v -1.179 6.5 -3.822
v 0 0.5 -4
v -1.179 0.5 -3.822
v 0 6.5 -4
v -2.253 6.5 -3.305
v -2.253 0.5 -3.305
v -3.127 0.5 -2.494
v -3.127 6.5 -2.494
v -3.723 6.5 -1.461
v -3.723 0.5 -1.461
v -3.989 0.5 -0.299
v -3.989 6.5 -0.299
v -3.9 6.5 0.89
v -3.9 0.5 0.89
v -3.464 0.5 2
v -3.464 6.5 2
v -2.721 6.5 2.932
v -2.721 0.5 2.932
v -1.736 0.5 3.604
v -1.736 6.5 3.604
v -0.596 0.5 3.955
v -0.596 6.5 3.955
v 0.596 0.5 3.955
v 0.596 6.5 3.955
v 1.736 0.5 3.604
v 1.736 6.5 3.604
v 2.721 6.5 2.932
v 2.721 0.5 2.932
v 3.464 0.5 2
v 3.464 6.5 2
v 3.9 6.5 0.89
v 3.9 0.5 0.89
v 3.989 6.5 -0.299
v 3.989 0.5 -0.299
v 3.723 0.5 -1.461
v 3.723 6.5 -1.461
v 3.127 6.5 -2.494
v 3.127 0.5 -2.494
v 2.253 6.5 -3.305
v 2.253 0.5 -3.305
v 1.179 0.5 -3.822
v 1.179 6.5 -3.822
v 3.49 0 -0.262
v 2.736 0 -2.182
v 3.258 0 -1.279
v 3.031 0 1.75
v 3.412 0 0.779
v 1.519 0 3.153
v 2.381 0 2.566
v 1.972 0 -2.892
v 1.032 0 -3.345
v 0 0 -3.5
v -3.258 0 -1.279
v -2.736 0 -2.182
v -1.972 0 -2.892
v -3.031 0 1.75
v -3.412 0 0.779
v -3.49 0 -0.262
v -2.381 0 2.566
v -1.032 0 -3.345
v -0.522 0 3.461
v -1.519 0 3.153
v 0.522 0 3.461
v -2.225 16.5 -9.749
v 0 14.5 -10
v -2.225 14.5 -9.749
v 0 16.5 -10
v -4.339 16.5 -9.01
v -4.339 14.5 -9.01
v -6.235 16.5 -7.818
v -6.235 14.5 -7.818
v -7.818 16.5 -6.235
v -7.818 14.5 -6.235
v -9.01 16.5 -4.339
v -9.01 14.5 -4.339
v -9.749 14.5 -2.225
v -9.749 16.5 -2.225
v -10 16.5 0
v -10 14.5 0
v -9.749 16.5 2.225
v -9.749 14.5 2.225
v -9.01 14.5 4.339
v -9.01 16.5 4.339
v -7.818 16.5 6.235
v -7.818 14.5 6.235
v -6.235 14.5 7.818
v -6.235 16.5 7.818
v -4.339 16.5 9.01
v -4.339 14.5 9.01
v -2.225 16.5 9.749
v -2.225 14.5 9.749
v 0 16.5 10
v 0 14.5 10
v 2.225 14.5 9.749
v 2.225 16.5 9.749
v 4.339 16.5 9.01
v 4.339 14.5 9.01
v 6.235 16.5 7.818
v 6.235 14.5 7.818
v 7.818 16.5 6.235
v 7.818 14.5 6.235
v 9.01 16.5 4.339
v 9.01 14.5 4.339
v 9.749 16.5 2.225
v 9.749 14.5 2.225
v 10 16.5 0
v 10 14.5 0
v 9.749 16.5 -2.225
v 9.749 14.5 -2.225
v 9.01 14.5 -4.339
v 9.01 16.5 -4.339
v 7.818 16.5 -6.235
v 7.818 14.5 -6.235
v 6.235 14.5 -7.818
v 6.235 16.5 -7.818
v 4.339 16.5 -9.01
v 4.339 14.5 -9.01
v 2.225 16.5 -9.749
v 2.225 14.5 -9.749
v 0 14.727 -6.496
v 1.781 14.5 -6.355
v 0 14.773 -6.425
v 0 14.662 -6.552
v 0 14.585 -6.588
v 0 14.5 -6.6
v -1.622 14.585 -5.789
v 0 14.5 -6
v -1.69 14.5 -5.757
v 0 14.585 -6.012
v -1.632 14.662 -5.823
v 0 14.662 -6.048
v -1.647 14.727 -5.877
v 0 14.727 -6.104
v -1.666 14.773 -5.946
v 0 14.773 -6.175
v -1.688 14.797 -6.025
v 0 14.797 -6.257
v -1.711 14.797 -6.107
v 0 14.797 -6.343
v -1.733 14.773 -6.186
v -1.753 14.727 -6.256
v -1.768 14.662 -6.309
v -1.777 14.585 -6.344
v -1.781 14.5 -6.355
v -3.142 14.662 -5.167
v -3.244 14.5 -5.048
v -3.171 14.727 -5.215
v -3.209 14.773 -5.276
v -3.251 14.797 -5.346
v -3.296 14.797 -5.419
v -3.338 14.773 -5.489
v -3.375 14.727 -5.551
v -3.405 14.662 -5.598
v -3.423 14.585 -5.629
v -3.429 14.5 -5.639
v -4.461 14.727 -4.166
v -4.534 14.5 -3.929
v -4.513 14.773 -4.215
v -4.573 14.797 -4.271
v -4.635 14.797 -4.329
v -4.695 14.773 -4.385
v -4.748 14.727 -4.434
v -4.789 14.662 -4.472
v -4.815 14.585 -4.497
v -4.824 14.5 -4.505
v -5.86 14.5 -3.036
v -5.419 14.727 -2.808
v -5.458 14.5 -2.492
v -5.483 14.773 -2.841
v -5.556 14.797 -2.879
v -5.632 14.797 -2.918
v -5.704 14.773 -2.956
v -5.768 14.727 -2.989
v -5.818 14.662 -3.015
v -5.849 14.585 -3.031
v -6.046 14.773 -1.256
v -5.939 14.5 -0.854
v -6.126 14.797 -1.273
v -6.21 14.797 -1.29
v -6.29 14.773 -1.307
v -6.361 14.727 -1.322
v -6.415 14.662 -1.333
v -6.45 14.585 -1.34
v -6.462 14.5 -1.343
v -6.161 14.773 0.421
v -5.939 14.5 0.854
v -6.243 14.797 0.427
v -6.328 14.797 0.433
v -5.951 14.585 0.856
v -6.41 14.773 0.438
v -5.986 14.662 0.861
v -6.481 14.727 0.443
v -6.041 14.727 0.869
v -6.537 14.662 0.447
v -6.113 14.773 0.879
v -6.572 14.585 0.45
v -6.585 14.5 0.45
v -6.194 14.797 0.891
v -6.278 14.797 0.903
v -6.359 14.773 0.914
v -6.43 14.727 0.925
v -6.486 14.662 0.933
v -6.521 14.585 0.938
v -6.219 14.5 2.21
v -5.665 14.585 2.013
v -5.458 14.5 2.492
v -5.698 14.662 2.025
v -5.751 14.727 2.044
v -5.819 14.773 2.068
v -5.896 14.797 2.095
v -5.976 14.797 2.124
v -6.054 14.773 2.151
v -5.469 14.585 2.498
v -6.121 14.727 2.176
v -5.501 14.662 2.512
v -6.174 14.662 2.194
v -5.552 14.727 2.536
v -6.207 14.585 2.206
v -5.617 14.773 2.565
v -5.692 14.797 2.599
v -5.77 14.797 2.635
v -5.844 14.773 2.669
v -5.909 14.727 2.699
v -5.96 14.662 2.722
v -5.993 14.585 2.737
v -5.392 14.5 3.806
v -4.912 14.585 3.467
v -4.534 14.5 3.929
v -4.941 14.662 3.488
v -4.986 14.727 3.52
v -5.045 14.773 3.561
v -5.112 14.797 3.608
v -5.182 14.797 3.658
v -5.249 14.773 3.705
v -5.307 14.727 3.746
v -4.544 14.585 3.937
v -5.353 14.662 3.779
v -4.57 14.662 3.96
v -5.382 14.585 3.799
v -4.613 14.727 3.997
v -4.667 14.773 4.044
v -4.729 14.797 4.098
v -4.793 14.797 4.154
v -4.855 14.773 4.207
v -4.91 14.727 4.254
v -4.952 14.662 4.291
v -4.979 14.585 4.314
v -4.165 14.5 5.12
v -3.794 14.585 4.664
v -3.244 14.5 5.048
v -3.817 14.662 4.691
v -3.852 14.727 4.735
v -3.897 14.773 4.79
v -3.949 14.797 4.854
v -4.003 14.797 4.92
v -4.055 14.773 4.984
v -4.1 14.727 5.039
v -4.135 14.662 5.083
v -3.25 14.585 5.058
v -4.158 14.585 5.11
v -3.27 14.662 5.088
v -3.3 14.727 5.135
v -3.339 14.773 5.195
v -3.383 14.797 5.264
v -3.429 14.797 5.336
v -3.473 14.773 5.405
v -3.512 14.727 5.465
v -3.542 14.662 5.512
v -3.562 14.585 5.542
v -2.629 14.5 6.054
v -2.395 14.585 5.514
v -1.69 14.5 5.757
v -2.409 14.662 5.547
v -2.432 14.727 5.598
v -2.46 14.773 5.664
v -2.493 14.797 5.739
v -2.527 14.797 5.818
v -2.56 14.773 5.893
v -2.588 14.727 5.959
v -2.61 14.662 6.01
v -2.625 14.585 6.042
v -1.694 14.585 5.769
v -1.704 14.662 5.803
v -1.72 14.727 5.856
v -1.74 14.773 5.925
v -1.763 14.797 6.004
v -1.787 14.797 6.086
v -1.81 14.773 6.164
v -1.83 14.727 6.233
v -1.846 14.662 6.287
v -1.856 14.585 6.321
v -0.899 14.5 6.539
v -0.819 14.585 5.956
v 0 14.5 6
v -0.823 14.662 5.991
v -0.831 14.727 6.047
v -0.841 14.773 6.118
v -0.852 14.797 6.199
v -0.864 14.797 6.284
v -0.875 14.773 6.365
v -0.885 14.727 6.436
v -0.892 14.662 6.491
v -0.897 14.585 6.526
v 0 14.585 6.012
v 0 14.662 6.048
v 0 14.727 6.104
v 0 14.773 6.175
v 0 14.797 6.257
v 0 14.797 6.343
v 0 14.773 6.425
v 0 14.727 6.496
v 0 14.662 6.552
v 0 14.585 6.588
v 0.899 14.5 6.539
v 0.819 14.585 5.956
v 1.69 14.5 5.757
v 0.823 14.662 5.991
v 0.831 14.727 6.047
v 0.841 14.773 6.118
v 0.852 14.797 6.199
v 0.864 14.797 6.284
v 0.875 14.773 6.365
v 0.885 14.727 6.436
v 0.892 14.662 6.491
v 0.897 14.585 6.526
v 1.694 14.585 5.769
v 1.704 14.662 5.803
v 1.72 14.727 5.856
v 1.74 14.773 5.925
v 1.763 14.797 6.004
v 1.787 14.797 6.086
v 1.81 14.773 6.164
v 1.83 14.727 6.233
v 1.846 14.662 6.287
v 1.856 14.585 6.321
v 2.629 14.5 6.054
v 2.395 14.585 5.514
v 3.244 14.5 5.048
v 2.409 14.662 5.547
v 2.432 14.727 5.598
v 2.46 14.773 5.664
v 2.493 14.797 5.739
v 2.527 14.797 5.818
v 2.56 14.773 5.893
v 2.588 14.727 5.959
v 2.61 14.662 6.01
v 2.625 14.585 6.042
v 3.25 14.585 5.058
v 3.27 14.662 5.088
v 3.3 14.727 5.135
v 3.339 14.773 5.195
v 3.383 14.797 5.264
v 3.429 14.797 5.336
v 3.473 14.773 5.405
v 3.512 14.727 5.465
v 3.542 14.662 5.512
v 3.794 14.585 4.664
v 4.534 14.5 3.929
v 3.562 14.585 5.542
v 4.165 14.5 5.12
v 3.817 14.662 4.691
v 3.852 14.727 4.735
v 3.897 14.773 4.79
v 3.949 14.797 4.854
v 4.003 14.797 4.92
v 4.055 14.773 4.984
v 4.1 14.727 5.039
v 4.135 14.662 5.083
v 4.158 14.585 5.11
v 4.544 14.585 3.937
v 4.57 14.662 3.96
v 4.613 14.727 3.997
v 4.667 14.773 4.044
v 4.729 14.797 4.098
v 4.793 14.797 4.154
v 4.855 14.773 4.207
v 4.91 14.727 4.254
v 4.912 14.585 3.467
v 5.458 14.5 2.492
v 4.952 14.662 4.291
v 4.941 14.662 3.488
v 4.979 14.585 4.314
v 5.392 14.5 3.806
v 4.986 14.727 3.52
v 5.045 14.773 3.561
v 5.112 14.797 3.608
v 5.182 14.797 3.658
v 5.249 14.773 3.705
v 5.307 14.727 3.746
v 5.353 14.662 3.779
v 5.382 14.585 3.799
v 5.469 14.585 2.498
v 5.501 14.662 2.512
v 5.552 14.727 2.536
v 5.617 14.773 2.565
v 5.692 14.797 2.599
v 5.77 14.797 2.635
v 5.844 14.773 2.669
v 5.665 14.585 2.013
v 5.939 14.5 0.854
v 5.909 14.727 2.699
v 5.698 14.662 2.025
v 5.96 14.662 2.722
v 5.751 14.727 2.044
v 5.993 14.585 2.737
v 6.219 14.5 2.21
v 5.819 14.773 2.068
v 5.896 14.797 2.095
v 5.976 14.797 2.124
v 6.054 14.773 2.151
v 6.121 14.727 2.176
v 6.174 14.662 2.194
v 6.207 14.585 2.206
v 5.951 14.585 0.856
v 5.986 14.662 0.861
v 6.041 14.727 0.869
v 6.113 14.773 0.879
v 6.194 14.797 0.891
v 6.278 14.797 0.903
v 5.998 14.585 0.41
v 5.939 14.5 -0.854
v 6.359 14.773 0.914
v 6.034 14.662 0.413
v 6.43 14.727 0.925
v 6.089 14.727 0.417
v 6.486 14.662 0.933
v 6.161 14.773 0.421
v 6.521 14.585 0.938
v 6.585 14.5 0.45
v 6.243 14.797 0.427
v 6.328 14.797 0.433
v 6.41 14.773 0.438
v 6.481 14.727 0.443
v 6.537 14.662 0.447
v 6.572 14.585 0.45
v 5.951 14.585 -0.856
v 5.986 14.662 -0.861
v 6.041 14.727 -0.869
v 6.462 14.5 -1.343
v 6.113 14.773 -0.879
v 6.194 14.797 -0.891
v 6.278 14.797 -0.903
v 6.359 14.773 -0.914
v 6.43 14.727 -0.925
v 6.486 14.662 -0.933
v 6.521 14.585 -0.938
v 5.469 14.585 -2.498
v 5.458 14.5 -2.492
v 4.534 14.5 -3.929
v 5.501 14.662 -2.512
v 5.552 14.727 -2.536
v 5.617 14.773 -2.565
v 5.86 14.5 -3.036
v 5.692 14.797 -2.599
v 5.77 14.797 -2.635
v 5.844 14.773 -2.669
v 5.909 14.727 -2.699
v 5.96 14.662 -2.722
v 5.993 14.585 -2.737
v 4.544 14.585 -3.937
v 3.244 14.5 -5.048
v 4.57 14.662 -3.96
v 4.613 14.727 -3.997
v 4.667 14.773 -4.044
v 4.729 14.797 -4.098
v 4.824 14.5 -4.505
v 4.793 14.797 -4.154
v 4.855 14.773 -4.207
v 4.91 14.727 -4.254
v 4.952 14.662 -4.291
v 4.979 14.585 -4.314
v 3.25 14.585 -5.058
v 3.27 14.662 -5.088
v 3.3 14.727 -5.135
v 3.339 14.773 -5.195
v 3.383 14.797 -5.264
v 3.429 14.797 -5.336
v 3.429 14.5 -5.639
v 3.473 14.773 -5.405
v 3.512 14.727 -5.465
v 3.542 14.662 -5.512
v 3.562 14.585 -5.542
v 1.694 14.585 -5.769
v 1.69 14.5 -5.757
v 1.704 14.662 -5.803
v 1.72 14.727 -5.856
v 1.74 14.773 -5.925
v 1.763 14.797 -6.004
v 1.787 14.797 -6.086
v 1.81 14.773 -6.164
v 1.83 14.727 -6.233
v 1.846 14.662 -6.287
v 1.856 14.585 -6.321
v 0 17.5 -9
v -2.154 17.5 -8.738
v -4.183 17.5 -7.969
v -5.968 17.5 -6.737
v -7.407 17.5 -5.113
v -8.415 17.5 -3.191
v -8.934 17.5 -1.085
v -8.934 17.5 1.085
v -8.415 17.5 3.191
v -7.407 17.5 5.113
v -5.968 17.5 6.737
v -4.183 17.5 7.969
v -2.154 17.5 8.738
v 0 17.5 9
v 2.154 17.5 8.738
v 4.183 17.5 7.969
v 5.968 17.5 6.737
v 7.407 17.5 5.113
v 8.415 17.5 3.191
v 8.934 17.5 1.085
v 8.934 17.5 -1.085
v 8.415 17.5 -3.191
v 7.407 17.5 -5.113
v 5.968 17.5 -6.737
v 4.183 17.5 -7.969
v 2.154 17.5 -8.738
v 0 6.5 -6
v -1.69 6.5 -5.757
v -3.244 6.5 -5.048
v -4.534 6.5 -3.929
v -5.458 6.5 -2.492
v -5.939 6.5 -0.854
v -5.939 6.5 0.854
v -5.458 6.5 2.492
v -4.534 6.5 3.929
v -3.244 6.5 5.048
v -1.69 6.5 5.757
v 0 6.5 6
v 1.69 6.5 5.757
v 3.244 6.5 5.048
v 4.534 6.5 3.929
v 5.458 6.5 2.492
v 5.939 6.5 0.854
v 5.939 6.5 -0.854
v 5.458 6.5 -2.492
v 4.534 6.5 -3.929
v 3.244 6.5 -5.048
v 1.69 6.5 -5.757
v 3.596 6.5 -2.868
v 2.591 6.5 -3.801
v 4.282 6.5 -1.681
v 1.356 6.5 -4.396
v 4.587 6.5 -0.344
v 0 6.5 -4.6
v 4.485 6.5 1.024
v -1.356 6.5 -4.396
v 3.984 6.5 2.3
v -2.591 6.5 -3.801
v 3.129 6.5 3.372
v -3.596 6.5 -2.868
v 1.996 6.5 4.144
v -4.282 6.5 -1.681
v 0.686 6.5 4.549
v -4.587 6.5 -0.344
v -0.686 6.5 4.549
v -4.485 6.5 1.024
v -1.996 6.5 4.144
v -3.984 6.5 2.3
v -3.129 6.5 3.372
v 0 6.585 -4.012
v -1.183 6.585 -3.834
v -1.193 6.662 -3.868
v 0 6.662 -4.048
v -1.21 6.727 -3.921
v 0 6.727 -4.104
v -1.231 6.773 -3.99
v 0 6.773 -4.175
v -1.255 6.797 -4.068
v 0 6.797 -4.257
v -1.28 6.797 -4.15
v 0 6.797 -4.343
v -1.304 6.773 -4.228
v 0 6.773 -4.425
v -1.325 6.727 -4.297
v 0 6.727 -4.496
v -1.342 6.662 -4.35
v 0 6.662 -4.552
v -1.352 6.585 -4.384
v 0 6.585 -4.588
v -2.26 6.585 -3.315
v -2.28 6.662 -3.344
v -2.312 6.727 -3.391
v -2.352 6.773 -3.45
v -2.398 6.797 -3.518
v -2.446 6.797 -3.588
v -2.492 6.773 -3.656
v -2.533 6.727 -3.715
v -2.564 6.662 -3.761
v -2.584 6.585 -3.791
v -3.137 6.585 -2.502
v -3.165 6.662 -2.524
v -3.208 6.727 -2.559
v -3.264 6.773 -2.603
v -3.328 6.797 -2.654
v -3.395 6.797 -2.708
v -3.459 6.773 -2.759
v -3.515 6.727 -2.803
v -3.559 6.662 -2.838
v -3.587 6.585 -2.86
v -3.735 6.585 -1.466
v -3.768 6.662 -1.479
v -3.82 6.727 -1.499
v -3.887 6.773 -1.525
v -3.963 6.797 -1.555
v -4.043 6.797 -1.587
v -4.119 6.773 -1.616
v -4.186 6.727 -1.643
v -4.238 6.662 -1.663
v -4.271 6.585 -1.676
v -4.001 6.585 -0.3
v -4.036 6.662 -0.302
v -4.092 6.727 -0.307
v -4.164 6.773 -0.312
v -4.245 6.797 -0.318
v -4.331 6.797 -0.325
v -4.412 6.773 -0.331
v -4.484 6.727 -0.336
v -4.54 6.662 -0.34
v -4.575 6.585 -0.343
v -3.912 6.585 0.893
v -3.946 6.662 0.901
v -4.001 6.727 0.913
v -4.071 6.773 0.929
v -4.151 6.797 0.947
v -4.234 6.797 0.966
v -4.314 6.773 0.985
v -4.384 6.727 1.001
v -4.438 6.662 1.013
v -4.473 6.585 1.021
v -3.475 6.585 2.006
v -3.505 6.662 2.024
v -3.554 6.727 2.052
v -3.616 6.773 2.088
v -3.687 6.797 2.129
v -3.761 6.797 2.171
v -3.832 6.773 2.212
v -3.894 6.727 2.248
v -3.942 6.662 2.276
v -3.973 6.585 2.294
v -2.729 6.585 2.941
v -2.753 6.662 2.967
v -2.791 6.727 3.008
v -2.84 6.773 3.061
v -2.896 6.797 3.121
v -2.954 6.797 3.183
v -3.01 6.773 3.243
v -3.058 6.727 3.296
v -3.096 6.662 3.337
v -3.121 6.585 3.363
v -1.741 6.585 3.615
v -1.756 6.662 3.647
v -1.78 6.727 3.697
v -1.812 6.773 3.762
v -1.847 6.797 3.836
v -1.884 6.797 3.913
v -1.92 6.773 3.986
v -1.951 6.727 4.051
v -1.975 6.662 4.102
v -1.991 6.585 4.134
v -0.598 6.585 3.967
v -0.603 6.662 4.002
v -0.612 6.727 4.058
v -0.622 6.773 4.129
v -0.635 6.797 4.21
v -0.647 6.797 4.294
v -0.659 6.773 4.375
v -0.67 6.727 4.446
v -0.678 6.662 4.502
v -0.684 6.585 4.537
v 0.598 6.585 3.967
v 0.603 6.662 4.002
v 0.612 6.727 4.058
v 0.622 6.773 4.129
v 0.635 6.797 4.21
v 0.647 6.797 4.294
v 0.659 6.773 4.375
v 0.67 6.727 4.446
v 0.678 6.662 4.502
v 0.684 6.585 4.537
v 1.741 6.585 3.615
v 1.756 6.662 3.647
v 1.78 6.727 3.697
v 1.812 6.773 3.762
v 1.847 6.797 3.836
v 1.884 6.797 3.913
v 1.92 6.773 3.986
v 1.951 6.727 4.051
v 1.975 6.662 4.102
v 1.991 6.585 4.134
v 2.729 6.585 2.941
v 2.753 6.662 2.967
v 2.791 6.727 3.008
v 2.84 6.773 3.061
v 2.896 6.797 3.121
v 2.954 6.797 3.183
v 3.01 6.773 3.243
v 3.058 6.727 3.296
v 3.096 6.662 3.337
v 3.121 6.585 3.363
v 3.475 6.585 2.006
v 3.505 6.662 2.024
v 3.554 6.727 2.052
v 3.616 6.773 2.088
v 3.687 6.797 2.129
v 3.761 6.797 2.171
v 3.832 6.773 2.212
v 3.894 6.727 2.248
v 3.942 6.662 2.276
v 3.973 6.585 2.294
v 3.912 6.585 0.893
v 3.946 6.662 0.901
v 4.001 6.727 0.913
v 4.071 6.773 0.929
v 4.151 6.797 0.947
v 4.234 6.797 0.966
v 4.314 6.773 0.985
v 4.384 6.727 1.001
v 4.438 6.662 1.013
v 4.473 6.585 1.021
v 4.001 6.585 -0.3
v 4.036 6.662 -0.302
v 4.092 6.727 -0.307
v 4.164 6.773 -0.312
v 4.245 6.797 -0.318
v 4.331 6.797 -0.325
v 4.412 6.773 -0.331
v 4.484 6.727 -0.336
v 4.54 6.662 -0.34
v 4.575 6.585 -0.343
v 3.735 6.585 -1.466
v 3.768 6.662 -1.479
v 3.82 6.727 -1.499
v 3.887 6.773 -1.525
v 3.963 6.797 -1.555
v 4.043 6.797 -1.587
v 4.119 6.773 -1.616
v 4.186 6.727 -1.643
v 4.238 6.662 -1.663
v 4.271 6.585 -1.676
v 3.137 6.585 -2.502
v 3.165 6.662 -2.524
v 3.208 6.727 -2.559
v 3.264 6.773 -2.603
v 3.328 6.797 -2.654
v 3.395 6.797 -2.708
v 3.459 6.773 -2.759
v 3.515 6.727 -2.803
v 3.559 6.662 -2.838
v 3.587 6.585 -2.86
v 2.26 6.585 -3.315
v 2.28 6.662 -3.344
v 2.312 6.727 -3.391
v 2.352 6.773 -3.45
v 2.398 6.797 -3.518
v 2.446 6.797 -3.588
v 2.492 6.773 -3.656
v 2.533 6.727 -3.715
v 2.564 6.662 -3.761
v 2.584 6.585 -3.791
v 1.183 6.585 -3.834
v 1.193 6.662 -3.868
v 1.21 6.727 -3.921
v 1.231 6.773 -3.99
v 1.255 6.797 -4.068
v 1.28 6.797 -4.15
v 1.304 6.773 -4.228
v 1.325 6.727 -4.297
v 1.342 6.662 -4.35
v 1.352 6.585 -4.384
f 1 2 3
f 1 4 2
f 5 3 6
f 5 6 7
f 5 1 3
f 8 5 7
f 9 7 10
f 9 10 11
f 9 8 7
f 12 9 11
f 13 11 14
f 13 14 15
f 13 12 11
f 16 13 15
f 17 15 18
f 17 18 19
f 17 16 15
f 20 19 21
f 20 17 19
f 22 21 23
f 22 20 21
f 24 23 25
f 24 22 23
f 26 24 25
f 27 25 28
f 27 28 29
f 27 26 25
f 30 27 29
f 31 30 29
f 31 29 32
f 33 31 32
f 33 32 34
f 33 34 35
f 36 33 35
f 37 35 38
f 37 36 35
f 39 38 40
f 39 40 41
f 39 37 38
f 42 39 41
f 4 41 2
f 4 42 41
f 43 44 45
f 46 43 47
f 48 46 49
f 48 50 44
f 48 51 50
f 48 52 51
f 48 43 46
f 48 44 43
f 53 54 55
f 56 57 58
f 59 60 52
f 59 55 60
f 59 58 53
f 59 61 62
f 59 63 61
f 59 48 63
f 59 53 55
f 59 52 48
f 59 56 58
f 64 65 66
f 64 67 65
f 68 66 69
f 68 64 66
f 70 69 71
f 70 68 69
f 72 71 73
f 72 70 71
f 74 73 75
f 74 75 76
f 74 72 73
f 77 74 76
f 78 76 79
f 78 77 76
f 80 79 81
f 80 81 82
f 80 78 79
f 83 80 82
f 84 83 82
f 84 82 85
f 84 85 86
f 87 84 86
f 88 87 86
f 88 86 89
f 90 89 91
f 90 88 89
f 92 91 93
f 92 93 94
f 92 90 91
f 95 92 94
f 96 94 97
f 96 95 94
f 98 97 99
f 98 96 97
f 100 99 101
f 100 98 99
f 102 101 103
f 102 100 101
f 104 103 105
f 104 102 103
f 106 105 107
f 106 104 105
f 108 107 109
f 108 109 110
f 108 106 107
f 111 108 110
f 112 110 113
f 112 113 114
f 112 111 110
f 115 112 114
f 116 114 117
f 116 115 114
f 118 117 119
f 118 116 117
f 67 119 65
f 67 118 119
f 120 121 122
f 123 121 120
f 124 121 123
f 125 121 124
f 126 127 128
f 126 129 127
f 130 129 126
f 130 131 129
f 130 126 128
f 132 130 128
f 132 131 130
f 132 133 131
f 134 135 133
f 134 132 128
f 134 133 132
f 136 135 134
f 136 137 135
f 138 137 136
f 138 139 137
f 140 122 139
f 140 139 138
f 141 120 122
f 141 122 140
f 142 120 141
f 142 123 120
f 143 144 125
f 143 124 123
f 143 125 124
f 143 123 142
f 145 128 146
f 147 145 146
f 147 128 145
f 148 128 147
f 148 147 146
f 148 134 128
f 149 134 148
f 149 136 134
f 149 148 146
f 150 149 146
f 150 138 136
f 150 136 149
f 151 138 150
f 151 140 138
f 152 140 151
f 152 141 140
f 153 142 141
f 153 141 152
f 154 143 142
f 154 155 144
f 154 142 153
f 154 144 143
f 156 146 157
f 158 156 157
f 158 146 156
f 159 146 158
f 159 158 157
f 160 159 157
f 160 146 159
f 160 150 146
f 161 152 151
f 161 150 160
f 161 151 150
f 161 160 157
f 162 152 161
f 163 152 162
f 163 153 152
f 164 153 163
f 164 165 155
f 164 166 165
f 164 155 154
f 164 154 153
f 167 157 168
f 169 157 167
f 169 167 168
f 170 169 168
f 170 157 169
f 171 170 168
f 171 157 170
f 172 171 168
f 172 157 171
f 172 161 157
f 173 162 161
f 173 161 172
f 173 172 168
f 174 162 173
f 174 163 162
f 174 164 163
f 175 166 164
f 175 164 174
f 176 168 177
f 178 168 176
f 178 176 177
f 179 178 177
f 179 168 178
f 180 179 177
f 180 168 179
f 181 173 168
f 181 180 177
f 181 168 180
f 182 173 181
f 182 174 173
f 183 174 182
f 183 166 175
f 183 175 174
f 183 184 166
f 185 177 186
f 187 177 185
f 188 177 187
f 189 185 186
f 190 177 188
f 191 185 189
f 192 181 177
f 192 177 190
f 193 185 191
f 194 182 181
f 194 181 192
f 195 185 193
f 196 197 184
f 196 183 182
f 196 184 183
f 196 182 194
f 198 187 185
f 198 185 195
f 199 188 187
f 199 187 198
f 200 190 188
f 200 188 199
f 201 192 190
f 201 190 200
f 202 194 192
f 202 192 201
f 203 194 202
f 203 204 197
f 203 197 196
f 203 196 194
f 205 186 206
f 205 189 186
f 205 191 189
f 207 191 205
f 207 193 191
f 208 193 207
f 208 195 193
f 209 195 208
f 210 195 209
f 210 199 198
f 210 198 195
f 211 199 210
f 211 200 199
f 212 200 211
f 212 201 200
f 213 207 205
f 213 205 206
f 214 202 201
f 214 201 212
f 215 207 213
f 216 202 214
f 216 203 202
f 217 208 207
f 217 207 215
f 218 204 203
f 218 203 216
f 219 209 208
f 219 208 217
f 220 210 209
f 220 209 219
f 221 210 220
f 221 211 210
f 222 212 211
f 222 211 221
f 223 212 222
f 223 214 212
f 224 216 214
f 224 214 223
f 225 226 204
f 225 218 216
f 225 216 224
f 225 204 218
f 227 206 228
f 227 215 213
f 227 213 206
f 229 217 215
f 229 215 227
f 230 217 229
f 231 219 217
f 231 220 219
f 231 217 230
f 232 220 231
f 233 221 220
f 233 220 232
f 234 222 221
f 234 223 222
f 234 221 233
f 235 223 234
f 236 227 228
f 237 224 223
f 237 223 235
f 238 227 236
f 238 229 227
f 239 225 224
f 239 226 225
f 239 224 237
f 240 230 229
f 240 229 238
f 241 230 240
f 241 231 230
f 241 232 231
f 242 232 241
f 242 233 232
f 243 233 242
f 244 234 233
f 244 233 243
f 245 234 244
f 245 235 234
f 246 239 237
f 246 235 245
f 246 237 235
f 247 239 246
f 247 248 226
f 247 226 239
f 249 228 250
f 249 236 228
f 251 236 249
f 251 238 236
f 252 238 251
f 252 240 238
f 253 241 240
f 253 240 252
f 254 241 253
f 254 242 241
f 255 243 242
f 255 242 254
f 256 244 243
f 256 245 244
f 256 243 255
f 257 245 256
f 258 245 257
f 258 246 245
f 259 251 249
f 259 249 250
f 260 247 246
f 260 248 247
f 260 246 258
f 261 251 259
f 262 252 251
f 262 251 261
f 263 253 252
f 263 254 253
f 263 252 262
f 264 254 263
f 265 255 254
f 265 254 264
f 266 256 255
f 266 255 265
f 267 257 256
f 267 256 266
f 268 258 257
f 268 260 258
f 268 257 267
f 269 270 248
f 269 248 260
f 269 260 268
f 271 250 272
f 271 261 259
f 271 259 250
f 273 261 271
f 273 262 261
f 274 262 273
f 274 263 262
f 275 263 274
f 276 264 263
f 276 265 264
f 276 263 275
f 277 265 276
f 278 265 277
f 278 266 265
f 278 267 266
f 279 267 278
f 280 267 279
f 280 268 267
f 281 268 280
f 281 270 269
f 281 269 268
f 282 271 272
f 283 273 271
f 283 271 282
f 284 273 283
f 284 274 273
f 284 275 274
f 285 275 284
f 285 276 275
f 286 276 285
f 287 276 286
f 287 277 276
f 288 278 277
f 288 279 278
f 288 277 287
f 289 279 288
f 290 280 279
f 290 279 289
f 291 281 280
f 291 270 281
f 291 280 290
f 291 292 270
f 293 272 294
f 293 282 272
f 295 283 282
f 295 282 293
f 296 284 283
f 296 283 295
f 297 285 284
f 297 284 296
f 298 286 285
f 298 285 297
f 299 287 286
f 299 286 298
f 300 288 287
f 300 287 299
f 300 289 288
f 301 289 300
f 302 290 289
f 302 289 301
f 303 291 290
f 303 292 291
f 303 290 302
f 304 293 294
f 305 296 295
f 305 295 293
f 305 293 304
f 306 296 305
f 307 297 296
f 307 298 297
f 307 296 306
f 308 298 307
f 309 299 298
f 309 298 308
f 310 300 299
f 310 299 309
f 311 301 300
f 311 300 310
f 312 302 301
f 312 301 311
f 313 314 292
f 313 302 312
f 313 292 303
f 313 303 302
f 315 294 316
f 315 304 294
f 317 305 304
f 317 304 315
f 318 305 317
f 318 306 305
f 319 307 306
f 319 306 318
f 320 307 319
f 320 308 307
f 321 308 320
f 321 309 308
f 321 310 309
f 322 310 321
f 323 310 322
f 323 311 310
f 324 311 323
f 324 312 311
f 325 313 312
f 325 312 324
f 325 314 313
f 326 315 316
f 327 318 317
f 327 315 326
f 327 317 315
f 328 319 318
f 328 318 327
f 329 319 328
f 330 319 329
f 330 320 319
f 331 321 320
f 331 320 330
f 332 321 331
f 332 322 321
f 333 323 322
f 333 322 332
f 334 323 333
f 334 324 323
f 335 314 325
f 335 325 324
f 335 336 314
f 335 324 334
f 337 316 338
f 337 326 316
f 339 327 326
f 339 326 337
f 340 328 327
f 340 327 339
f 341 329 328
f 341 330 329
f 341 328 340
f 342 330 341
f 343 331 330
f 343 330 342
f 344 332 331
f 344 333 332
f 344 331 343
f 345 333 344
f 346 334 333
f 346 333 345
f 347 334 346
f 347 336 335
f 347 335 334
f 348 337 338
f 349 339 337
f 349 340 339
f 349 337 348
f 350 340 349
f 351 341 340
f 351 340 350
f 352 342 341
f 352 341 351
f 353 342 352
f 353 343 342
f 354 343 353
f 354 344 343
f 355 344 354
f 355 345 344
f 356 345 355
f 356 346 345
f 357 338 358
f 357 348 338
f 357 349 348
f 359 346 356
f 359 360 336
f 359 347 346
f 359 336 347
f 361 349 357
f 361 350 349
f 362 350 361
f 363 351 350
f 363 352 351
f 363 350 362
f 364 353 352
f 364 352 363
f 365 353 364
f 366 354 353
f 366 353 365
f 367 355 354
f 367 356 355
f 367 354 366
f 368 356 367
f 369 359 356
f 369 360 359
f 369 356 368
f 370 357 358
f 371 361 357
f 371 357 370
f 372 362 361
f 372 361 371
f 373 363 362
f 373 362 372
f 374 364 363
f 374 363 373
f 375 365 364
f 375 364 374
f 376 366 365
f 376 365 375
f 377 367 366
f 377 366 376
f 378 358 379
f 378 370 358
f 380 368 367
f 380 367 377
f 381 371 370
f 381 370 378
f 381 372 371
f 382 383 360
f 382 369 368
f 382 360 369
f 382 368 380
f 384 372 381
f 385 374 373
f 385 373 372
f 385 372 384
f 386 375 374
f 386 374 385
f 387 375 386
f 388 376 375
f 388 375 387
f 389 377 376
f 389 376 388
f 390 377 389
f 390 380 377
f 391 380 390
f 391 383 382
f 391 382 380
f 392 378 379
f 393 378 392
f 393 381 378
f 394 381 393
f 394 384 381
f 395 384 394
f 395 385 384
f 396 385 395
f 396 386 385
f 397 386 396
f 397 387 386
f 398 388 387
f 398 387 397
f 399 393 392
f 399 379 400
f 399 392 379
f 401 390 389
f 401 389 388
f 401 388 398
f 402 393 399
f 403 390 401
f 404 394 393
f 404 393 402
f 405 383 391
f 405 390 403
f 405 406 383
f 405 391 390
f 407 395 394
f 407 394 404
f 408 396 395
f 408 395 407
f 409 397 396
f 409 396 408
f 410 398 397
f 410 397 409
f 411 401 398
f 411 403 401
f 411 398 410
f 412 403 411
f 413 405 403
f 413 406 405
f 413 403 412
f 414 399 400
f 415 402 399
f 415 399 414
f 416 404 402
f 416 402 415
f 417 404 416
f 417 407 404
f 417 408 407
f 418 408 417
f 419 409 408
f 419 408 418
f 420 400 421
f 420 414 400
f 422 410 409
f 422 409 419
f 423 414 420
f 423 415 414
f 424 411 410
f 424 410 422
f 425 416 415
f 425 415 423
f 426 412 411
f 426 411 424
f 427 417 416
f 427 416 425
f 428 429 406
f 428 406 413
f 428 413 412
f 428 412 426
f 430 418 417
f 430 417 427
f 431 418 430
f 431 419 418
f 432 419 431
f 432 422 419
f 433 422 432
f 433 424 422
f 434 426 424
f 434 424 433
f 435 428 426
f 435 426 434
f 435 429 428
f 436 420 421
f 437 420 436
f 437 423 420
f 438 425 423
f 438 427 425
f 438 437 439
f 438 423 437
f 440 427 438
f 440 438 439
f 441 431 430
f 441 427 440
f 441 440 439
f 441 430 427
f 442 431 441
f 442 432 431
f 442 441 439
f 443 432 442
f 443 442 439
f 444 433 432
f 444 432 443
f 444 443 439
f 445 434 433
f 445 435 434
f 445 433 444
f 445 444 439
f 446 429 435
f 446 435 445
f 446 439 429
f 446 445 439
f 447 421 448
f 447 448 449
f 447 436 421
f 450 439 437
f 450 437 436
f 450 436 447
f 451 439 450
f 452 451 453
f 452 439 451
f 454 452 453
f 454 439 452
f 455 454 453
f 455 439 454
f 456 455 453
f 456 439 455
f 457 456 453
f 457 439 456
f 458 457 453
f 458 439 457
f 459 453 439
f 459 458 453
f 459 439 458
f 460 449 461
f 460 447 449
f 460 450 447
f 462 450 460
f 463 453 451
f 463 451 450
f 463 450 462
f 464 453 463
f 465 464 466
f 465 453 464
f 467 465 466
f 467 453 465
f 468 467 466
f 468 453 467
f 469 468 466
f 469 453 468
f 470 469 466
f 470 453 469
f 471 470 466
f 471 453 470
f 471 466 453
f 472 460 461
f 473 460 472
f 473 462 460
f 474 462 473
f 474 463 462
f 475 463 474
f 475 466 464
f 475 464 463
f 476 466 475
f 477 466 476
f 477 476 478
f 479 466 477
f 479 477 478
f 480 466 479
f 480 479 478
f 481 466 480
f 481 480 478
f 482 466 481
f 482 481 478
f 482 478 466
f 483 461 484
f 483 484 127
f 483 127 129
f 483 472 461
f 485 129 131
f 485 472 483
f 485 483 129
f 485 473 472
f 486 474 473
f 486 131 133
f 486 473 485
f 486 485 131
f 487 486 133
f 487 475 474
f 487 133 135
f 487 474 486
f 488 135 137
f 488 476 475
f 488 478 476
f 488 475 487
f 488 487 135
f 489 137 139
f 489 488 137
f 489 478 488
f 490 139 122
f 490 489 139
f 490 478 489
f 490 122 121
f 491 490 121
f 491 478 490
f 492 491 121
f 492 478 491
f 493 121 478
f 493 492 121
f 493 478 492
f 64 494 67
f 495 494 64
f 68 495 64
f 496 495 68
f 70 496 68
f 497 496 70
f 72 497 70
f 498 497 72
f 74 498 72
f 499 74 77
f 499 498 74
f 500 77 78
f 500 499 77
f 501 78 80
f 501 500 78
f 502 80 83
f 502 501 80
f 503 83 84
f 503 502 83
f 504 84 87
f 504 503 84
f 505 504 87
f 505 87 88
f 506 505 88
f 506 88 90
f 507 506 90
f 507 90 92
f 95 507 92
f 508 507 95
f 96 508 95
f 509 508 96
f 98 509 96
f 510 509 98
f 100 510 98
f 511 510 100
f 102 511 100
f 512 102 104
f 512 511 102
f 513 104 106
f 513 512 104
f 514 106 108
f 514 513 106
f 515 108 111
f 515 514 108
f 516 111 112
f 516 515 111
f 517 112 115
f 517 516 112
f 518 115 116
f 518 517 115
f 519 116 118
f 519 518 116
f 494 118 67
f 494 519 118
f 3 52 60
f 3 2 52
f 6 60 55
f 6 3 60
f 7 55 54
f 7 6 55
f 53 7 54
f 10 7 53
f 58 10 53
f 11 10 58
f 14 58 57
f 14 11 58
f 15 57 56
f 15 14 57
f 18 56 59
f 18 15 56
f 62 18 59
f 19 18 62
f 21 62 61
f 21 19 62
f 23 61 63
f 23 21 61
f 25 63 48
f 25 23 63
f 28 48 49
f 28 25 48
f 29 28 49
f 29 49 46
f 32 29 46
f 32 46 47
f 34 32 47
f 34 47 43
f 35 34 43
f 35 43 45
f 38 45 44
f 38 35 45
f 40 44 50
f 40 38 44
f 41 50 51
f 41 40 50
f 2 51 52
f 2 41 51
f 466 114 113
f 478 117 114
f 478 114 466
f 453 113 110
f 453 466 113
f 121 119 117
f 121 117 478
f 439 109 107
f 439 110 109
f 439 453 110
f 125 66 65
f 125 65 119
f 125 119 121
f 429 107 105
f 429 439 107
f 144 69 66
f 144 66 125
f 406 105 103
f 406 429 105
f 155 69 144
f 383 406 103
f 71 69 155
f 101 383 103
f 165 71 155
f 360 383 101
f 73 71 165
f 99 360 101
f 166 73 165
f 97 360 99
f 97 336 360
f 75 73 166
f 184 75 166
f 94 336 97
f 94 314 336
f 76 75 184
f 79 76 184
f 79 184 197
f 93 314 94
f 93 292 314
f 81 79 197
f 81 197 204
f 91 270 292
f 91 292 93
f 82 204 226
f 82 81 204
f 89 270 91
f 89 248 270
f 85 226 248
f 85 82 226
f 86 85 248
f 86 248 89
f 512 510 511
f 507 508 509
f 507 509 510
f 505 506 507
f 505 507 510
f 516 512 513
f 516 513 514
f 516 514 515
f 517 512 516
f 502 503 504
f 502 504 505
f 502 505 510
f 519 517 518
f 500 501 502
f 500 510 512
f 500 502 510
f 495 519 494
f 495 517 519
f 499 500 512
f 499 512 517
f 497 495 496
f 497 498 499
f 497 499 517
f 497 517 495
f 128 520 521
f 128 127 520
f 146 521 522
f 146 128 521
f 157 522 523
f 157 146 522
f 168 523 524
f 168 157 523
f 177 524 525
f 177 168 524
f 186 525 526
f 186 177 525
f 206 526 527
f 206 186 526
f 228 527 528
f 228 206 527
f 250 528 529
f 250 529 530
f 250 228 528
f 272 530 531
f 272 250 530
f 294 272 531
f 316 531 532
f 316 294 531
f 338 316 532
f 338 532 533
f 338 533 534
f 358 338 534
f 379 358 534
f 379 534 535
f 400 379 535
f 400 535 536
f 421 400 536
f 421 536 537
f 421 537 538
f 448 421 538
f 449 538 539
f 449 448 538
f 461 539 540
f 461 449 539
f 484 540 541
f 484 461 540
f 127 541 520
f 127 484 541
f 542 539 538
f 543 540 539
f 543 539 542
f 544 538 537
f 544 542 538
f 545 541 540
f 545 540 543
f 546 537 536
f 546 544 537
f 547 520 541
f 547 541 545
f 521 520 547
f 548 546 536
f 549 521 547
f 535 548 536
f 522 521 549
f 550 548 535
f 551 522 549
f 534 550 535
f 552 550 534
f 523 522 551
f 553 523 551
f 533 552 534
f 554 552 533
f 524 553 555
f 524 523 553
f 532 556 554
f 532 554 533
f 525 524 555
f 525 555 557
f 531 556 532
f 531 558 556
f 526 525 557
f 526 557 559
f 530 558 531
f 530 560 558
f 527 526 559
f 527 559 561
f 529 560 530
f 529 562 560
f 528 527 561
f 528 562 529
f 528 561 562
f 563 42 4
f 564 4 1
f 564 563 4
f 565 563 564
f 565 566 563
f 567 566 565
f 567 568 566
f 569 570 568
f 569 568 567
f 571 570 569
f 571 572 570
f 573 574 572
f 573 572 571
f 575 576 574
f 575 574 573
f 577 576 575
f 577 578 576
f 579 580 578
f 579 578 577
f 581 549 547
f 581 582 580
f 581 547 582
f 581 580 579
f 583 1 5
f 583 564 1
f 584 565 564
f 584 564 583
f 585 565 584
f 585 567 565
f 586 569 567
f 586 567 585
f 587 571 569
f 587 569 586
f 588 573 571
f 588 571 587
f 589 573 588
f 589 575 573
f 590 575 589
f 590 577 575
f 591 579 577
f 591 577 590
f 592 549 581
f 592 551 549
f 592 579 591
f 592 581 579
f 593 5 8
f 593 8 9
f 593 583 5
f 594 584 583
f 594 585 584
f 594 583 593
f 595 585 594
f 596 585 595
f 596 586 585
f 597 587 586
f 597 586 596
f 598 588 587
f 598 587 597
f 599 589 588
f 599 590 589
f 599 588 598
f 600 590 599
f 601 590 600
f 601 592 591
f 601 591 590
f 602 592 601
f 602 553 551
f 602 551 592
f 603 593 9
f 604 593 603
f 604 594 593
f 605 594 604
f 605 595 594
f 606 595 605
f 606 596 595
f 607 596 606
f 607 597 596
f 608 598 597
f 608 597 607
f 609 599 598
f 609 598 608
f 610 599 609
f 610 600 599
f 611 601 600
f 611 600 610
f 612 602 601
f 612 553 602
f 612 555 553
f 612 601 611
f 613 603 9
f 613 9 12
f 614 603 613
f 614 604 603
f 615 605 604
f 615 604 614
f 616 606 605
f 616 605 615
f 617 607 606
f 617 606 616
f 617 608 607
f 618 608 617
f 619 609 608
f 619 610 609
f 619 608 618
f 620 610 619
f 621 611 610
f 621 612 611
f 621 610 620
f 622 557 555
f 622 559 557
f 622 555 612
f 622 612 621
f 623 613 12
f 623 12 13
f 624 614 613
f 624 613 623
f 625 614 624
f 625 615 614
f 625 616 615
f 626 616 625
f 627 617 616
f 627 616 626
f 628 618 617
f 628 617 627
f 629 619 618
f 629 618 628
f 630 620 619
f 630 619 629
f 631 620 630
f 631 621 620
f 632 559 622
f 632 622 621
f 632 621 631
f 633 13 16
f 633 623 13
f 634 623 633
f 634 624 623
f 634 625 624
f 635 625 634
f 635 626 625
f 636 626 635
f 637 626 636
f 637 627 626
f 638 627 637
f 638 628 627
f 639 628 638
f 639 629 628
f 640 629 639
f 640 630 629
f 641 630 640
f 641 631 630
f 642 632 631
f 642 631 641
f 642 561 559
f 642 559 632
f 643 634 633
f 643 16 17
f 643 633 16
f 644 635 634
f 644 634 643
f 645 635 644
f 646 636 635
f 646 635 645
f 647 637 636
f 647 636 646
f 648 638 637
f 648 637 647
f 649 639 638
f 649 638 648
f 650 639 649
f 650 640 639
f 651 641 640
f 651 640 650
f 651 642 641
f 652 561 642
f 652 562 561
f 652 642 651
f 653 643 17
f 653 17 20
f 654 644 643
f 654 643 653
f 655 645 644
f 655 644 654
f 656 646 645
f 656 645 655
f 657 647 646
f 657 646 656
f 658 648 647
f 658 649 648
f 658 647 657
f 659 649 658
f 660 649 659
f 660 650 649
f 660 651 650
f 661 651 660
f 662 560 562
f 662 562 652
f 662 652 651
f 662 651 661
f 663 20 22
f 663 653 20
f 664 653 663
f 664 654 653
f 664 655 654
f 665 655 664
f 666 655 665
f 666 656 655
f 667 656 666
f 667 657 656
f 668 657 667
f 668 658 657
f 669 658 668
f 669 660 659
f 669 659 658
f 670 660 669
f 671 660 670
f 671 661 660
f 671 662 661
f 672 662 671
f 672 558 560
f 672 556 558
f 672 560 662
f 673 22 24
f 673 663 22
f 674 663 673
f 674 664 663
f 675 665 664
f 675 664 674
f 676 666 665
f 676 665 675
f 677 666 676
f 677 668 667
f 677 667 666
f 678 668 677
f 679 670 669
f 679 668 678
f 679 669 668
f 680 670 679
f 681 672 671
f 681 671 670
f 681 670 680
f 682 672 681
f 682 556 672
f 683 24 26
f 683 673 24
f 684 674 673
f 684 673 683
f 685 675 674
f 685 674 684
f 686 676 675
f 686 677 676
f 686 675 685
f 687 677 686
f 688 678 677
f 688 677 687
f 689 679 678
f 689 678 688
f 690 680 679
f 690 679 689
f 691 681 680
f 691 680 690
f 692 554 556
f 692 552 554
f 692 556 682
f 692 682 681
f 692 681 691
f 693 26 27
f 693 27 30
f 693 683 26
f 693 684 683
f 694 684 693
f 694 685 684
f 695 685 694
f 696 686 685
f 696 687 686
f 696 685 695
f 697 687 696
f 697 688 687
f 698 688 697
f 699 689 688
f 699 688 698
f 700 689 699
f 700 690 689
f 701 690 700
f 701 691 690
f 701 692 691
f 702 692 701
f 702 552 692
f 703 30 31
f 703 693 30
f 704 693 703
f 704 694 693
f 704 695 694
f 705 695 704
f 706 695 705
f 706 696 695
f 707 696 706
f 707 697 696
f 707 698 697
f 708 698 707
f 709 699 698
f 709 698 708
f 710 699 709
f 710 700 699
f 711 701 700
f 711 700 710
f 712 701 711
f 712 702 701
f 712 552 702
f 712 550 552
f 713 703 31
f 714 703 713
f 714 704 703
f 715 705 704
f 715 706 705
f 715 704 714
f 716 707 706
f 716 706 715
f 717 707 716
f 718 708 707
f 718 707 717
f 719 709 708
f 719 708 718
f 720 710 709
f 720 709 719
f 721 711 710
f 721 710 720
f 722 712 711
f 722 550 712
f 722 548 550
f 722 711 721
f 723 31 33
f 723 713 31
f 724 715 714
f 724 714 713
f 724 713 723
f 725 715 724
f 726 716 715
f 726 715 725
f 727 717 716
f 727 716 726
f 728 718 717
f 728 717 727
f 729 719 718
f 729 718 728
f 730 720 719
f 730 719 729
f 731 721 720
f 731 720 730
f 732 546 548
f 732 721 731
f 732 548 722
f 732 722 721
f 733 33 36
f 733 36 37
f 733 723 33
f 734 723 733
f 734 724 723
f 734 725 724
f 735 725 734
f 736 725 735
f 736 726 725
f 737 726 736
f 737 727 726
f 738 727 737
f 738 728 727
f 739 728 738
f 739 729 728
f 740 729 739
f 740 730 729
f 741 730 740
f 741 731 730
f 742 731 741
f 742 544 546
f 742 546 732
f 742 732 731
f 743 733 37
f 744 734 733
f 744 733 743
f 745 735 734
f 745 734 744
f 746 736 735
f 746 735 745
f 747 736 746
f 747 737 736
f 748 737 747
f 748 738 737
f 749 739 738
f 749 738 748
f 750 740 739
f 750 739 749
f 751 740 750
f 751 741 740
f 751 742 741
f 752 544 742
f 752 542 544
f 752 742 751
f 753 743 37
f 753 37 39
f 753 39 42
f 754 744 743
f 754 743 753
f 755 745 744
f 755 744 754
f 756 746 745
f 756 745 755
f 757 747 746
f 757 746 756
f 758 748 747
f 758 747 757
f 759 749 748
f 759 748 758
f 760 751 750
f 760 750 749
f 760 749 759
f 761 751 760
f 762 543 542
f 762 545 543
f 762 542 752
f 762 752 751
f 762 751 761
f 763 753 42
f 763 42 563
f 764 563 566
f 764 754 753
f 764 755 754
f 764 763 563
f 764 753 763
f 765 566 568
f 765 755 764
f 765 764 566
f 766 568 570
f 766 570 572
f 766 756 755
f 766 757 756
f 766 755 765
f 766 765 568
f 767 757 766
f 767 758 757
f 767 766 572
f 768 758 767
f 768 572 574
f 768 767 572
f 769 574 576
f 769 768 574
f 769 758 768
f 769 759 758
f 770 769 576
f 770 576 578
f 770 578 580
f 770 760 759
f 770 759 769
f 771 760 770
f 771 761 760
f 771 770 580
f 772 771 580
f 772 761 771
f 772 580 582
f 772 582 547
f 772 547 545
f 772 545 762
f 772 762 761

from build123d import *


with BuildPart() as part:
    # Esquisse1 → Base-Révolution (revolve)
    with BuildSketch(Plane.XY, mode=Mode.PRIVATE) as base_r_volution_sk:
        with BuildLine():
            Line((0, 0), (3.5, 0))
            Line((3.5, 0), (4, 0.5))
            Line((4, 0.5), (4, 6.5))
            ThreePointArc((4, 6.5), (4.3, 6.8), (4.6, 6.5))
            Line((4.6, 6.5), (6, 6.5))
            Line((6, 6.5), (6, 14.5))
            ThreePointArc((6, 14.5), (6.3, 14.8), (6.6, 14.5))
            Line((6.6, 14.5), (10, 14.5))
            Line((10, 14.5), (10, 16.5))
            Line((10, 16.5), (9, 17.5))
            Line((9, 17.5), (0, 17.5))
            Line((0, 17.5), (0, 0))
        make_face()
    revolve(base_r_volution_sk.sketch.rotate(Axis((0, 0, 0), (0, 1, 0)), 90), axis=Axis((0, 0, 0), (0, 1, 0)))


solid = part.part
